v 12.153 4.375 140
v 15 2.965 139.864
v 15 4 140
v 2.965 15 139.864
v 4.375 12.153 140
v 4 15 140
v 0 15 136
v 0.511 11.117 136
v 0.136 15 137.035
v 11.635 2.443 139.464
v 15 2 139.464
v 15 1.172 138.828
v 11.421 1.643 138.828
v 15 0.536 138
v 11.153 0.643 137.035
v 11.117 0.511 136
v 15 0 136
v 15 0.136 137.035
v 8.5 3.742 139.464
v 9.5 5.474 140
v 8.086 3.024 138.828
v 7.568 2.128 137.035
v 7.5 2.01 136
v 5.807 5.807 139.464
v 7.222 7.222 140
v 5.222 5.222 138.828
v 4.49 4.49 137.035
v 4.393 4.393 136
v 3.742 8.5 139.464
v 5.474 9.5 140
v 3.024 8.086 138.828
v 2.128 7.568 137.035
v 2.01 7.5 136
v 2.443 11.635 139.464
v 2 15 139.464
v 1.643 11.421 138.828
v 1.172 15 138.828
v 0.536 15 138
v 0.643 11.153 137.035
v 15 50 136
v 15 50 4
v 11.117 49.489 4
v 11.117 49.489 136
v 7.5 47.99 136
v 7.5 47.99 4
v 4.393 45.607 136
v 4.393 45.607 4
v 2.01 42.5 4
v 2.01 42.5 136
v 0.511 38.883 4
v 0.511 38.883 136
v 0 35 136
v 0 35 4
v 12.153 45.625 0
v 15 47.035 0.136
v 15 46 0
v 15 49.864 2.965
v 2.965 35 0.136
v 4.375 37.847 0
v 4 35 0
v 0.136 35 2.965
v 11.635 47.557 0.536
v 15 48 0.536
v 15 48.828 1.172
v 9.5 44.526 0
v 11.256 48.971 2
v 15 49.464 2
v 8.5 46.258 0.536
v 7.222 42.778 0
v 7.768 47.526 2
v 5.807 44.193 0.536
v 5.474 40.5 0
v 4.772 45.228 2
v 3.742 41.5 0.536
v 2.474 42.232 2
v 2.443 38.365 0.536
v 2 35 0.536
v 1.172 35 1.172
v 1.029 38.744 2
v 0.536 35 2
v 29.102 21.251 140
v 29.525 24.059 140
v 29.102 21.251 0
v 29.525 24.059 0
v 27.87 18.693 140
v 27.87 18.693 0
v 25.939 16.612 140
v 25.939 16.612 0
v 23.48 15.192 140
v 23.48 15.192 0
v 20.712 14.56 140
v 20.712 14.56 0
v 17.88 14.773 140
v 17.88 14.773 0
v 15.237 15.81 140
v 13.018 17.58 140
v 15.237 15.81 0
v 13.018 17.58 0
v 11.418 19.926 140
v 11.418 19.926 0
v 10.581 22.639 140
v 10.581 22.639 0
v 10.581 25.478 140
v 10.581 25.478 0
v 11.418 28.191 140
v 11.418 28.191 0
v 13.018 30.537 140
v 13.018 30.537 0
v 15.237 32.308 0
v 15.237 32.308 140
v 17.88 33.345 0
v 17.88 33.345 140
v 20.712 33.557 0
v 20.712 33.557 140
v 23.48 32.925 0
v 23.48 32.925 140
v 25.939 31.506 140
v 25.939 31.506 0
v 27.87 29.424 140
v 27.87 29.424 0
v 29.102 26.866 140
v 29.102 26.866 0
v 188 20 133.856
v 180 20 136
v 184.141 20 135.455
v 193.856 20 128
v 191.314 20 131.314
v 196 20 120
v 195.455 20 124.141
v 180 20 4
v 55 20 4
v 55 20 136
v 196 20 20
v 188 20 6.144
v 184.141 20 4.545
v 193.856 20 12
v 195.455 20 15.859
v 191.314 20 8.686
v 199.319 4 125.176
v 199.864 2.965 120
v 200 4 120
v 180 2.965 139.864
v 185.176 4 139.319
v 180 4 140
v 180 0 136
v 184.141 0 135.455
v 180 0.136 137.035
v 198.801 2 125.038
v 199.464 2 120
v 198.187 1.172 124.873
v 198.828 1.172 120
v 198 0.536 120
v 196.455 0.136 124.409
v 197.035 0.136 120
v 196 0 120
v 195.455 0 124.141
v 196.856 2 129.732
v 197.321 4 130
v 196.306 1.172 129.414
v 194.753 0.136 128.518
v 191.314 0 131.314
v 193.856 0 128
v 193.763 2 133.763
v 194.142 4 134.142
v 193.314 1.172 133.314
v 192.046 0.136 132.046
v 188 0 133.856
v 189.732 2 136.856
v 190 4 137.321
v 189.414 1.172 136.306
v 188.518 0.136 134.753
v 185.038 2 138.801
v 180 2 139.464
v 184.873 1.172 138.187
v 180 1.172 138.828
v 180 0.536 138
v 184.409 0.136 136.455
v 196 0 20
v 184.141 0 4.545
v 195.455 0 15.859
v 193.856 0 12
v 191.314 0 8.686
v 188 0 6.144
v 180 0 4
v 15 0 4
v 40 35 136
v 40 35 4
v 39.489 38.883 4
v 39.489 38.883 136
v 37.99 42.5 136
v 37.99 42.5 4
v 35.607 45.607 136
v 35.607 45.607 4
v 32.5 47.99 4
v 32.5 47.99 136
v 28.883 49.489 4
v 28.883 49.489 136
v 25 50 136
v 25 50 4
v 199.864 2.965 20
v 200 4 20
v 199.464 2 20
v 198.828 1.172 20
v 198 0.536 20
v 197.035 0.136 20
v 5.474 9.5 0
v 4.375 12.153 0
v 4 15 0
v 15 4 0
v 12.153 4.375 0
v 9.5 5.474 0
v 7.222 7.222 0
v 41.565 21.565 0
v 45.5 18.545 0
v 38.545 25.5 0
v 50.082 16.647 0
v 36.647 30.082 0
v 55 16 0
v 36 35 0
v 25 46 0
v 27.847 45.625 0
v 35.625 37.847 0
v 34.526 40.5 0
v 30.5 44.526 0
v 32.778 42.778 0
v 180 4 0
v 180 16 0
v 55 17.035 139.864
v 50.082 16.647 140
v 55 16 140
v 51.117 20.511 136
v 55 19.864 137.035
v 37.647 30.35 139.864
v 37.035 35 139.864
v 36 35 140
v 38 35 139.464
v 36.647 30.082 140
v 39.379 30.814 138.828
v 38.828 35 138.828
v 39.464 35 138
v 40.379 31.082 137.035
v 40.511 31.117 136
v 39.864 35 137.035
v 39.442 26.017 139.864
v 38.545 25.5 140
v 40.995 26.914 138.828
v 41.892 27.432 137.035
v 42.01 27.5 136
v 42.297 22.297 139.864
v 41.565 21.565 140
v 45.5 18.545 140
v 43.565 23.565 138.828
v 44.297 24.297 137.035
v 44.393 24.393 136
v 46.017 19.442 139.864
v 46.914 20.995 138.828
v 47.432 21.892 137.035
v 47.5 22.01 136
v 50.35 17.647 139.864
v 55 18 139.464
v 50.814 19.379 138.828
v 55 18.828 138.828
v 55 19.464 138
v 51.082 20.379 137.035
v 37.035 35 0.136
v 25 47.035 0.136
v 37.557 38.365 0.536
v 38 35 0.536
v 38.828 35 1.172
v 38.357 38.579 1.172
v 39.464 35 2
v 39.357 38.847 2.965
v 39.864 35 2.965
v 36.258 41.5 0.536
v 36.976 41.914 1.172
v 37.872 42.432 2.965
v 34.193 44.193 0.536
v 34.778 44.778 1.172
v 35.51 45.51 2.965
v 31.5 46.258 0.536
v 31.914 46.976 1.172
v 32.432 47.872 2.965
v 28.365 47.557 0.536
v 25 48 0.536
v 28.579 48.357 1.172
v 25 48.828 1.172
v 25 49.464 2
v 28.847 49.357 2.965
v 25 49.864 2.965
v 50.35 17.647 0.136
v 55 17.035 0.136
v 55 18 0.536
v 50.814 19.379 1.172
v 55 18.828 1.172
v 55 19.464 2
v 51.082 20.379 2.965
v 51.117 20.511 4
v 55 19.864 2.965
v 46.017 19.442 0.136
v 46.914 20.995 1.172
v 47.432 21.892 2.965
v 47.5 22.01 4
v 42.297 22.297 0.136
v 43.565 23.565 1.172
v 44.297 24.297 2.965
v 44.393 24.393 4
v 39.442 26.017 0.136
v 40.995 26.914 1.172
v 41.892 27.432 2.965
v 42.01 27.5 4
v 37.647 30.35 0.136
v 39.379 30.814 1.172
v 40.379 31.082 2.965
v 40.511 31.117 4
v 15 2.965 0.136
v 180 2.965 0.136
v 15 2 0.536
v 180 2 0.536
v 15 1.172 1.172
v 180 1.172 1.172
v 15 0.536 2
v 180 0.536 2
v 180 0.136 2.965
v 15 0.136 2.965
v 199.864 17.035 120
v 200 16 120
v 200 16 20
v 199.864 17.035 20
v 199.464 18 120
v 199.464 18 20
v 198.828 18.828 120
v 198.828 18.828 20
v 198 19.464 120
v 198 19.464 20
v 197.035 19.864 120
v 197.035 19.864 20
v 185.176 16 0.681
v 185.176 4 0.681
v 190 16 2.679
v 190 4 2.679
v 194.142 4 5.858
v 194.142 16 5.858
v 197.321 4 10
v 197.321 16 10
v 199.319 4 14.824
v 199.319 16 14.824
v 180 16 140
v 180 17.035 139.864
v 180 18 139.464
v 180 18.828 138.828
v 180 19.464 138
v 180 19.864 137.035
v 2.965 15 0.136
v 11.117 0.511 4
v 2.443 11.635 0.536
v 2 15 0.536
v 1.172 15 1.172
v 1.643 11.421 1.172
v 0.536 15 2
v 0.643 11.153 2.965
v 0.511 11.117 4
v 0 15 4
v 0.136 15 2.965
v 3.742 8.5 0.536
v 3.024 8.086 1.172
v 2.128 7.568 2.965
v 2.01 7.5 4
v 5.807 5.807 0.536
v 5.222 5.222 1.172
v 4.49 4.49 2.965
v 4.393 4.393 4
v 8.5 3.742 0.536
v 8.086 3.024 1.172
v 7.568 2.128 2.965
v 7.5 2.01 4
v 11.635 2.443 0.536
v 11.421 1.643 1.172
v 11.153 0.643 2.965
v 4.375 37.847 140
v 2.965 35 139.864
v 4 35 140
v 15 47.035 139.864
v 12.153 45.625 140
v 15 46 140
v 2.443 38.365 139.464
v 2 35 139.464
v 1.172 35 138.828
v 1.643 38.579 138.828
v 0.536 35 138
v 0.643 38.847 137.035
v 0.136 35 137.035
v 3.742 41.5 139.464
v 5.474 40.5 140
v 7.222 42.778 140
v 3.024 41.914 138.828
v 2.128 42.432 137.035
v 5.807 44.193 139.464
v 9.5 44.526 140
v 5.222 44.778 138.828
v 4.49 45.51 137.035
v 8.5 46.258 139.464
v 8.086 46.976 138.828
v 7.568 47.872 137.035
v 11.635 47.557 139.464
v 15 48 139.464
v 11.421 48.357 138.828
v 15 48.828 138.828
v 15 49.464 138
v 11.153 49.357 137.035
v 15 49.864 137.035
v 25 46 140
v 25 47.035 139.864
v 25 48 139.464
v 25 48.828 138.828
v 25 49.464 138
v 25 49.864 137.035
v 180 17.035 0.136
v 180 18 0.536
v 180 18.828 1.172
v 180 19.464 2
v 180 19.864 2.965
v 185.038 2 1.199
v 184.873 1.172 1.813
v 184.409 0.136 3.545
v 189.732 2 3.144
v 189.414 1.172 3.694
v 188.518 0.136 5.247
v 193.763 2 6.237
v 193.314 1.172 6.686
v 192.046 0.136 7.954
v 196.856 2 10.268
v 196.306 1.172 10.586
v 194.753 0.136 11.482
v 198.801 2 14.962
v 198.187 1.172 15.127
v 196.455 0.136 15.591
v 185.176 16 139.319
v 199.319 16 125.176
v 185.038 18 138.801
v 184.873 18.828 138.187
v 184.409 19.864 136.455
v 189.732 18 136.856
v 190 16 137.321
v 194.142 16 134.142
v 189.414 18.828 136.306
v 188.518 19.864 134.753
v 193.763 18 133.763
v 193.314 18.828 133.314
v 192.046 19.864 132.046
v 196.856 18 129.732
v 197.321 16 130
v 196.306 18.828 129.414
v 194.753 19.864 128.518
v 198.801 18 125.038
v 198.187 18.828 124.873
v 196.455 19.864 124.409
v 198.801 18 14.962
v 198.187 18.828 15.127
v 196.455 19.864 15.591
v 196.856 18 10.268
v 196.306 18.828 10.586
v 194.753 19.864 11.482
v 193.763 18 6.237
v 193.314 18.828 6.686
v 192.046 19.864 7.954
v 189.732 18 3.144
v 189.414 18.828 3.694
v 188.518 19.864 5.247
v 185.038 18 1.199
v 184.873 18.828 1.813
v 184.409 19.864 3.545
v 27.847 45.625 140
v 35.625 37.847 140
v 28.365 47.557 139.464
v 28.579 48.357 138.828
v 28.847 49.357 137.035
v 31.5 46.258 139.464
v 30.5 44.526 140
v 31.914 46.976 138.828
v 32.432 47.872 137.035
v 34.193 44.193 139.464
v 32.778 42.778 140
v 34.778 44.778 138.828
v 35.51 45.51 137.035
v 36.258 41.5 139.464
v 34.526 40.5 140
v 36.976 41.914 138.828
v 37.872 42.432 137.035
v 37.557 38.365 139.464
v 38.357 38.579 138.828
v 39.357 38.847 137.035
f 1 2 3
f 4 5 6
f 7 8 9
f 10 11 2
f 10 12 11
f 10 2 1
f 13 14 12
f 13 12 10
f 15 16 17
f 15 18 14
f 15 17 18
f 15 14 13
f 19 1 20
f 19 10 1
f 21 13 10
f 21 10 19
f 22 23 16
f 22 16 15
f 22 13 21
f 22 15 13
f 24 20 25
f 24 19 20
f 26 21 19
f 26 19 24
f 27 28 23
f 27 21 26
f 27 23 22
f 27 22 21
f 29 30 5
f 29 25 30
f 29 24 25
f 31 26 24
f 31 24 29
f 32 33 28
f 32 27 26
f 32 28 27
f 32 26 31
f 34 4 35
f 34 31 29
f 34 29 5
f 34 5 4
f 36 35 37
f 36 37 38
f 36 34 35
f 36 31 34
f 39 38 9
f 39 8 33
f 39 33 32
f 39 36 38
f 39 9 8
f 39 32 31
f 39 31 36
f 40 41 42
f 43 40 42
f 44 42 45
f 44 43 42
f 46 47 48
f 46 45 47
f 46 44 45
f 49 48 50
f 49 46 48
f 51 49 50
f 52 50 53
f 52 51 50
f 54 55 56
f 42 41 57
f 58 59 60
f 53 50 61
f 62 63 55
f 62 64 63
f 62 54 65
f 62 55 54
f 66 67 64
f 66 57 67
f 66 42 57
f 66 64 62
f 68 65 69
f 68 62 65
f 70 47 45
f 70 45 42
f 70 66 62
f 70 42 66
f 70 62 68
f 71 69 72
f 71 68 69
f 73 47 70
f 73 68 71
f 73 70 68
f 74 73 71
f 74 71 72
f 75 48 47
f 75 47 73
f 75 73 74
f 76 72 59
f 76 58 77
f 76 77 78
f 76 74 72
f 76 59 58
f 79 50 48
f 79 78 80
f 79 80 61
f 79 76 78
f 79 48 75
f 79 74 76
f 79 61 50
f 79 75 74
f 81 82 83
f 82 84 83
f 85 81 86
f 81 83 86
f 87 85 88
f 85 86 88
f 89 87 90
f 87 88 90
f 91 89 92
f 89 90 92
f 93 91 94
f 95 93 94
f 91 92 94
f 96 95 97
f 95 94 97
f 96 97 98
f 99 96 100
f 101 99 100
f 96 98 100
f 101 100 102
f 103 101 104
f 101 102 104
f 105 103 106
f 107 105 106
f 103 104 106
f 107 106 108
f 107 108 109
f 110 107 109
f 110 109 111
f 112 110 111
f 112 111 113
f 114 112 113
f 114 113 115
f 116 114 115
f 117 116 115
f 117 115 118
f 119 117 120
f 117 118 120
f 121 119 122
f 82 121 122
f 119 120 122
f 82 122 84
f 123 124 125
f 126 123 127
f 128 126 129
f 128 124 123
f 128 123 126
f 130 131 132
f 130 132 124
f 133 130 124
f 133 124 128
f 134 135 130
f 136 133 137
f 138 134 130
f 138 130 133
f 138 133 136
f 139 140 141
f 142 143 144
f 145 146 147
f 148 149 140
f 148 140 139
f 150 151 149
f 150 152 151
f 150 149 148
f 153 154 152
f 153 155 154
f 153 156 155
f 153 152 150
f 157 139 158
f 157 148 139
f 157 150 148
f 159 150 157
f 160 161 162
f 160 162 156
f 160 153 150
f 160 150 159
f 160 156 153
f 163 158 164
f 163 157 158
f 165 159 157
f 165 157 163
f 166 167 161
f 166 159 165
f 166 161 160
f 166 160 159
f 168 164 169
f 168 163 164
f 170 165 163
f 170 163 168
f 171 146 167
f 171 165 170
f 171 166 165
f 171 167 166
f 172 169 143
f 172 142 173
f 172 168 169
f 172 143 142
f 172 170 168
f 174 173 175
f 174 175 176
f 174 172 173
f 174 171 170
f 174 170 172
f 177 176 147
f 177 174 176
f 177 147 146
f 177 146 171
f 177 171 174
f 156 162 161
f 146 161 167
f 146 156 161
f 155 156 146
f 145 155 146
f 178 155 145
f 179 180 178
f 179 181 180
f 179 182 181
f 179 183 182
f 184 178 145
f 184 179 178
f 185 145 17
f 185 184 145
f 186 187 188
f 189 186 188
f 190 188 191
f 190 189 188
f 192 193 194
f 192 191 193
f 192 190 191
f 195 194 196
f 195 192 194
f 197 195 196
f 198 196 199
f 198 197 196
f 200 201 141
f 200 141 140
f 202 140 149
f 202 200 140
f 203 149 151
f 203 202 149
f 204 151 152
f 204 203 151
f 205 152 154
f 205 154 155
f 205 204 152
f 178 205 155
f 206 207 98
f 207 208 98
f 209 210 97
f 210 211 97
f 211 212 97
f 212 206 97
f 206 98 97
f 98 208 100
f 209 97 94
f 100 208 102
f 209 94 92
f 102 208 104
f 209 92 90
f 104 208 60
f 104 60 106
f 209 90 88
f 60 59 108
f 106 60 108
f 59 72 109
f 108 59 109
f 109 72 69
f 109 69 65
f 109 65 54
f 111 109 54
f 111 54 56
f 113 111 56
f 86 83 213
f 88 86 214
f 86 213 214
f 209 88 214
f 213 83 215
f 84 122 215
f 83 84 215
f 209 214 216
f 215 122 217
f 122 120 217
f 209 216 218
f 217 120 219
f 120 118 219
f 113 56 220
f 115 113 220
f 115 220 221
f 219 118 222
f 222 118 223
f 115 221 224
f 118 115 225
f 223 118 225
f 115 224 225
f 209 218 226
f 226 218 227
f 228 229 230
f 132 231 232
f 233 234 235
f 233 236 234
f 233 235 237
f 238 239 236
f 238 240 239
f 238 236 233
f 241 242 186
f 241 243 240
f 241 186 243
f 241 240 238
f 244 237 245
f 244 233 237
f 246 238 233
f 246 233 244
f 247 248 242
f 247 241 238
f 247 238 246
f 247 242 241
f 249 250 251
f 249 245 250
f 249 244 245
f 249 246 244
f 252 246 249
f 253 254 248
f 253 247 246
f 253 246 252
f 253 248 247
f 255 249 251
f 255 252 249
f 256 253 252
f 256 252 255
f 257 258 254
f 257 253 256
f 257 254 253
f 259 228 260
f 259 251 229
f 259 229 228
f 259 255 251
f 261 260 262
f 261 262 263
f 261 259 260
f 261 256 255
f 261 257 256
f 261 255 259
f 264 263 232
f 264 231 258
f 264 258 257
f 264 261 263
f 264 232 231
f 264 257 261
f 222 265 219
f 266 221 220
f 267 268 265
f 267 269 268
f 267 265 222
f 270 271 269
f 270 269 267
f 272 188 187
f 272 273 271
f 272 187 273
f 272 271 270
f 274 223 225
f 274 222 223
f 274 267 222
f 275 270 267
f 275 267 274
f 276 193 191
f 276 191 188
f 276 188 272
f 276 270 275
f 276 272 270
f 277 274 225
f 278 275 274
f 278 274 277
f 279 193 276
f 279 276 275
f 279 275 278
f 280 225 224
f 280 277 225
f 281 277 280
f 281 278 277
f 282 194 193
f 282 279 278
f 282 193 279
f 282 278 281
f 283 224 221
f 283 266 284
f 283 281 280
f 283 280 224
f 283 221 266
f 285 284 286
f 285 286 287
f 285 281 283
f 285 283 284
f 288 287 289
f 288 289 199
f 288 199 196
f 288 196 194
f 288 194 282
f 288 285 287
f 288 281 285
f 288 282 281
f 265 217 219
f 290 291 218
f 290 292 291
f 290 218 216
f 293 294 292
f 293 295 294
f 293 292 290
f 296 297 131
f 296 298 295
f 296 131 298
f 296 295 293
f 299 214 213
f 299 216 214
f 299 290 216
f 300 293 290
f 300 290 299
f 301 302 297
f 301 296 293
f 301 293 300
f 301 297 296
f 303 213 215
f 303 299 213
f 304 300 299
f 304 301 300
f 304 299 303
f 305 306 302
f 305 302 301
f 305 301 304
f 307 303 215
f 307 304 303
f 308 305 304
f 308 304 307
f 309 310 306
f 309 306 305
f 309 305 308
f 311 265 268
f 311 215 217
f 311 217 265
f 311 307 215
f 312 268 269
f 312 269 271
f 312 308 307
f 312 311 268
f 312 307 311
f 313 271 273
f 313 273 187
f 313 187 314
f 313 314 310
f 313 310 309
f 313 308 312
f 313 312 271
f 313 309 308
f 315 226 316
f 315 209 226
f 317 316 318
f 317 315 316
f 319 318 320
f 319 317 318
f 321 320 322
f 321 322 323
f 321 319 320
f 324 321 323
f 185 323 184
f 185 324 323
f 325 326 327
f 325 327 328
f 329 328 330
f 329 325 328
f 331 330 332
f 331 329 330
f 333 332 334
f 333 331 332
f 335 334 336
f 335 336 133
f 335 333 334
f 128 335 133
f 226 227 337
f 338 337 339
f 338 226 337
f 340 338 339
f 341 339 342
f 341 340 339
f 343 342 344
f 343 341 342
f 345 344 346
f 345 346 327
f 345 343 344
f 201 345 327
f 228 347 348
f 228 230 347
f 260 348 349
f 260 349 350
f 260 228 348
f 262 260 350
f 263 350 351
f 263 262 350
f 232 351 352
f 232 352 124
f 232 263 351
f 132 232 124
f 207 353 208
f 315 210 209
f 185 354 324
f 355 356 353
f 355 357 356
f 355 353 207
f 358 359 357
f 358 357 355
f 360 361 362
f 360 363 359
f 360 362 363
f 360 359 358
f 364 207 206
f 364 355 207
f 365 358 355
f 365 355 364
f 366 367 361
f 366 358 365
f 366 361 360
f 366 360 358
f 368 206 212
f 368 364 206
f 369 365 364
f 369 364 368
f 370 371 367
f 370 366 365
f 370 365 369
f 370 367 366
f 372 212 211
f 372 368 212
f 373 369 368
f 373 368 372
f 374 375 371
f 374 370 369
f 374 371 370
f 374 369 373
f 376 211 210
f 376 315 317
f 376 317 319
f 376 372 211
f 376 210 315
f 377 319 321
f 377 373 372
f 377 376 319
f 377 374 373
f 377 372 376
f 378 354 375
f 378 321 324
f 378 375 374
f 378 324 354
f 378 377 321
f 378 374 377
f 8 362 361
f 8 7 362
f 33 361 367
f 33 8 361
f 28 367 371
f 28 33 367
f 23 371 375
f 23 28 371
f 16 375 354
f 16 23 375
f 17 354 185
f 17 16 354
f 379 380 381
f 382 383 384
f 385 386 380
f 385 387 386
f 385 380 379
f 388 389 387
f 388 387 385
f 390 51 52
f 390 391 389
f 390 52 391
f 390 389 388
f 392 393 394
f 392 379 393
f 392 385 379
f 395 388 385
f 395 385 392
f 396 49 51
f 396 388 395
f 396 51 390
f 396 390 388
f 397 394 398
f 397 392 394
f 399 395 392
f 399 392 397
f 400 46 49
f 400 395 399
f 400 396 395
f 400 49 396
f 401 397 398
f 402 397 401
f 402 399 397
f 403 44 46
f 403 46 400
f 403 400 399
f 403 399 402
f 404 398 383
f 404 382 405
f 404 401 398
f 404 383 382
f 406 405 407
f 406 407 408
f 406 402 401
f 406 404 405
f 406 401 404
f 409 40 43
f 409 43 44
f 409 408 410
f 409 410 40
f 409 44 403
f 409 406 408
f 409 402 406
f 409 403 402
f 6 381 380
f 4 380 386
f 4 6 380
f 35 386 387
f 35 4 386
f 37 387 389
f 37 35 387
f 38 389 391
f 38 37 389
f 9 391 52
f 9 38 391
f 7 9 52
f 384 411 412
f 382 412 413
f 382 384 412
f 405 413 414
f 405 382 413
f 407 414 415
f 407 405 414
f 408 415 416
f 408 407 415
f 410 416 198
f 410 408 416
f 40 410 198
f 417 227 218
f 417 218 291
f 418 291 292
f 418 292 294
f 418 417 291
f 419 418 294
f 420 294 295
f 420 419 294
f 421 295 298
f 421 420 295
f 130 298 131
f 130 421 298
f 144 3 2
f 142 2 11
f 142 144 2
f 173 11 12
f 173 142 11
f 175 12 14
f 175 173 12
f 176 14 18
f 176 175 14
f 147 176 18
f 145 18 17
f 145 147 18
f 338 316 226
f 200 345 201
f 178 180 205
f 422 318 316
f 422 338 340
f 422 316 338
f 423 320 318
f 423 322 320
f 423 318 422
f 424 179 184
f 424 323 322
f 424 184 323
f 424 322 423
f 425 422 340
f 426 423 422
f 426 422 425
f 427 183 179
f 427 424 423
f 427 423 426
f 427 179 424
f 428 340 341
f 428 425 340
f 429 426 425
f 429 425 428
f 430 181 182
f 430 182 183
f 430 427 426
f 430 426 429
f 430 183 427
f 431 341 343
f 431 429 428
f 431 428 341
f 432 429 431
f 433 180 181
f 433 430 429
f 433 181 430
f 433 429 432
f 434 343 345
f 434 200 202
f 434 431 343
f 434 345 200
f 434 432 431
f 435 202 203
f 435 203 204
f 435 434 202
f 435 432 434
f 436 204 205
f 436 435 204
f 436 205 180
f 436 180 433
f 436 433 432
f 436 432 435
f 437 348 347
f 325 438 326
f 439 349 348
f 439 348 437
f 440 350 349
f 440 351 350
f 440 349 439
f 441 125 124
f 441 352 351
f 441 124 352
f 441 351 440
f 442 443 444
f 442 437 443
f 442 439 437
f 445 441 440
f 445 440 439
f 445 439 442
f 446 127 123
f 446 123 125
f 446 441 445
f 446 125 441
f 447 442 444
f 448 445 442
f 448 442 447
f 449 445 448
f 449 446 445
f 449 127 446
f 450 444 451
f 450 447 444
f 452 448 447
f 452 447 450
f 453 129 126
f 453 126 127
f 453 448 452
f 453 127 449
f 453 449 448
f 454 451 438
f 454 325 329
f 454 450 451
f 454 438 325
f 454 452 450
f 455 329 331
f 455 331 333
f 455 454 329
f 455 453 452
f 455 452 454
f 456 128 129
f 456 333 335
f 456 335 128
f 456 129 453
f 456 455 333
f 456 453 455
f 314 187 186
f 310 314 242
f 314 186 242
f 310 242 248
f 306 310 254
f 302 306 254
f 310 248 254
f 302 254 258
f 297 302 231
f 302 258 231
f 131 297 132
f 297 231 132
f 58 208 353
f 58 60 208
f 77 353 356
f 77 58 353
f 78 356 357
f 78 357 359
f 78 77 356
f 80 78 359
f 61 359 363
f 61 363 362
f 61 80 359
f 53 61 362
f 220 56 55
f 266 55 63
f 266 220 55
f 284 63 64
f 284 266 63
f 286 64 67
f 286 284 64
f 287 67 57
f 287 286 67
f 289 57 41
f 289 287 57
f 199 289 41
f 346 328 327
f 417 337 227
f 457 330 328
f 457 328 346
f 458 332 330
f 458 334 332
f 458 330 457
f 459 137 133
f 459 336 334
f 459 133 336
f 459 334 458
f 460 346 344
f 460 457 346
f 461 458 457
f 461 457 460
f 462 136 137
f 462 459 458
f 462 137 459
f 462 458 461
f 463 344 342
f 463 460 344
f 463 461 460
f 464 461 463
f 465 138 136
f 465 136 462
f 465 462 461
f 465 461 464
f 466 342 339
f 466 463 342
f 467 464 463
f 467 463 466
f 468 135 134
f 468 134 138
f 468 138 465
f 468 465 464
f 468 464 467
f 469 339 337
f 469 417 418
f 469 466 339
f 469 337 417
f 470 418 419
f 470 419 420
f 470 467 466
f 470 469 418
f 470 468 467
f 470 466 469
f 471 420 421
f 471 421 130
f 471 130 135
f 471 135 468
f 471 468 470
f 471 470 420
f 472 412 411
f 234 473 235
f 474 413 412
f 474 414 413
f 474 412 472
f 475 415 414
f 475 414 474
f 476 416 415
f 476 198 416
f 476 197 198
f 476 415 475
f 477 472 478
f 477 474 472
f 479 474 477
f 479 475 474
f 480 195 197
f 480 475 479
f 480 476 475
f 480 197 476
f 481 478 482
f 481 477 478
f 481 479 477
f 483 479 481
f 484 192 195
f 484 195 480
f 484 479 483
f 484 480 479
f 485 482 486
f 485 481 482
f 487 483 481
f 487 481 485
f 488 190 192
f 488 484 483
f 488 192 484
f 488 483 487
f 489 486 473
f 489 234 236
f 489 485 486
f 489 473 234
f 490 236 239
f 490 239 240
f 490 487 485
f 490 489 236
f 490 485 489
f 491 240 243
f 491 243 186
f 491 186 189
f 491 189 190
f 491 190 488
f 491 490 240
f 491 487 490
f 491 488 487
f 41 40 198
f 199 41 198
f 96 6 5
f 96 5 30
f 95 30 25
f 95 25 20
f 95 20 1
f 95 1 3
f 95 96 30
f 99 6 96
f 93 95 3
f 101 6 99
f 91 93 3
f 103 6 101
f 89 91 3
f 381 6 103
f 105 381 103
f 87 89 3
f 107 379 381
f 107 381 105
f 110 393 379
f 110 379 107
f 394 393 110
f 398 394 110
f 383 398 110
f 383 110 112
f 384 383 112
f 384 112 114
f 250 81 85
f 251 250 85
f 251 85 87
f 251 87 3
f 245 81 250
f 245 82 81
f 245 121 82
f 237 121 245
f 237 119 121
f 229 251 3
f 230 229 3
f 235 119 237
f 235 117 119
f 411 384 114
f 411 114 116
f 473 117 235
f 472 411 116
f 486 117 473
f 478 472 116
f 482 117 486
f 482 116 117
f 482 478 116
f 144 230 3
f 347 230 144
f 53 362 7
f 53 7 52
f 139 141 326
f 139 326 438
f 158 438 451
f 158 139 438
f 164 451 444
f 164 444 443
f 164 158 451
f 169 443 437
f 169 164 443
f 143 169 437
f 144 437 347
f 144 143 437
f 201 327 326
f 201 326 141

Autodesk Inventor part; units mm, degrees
ref_plane "YZ Plane" through (0, 0, 0) normal (1, 0, 0) x (0, 1, 0)
ref_plane "XZ Plane" through (0, 0, 0) normal (0, 1, 0) x (-1, 0, 0)
ref_plane "XY Plane" through (0, 0, 0) normal (0, 0, 1) x (1, 0, 0)
sketch "Sketch1" plane through (0, 0, 0) normal (0, 0, 1) x (1, 0, 0)
  line L0 (0, 0) -> (0, 50)
  line L1 (0, 50) -> (40, 50)
  line L2 (40, 50) -> (40, 20)
  line L3 (40, 20) -> (200, 20)
  line L4 (200, 20) -> (200, 0)
  line L5 (200, 0) -> (0, 0)
  line L6 (20, 50) -> (20, -1.8826)
  line L7 (20, -1.8826) -> (20, 0)
  circle A0 centre (20, 24.0587) radius 9.525
  dimension "d0" = 200
  dimension "d1" = 50
  dimension "d2" = 40
  dimension "d3" = 20
  dimension "d4" = 19.05
extrude "Extrusion1" add sketch "Sketch1" along normal blind 140 contours L0 L1 L6 A0 L5 | L6 A0 L1 L2 L3 L4 L5
fillet "Fillet1" radius 15 4 edges at (0, 50, 70) (40, 50, 70) (40, 20, 70) (0, 0, 70)
fillet "Fillet2" radius 20 2 edges at (200, 10, 140) (200, 10, 0)
fillet "Fillet3" radius 4 22 edges at (4.3933, 45.6067, 0) (0, 25, 0) (4.3933, 4.3933, 0) (97.4998, 0, 0) (194.1421, 0, 5.8579) (200, 0, 70) (194.1421, 0, 134.1421) (97.4998, 0, 140) (4.3933, 4.3933, 140) (0, 25, 140) (4.3933, 45.6067, 140) (20, 50, 140) (35.6067, 45.6067, 140) (40, 35, 140) (117.4998, 20, 140) (194.1421, 20, 134.1421) (200, 20, 70) (194.1421, 20, 5.8579) (117.4998, 20, 0) (40, 35, 0) (35.6067, 45.6067, 0) (20, 50, 0)
properties part number "foot rest EG26"
